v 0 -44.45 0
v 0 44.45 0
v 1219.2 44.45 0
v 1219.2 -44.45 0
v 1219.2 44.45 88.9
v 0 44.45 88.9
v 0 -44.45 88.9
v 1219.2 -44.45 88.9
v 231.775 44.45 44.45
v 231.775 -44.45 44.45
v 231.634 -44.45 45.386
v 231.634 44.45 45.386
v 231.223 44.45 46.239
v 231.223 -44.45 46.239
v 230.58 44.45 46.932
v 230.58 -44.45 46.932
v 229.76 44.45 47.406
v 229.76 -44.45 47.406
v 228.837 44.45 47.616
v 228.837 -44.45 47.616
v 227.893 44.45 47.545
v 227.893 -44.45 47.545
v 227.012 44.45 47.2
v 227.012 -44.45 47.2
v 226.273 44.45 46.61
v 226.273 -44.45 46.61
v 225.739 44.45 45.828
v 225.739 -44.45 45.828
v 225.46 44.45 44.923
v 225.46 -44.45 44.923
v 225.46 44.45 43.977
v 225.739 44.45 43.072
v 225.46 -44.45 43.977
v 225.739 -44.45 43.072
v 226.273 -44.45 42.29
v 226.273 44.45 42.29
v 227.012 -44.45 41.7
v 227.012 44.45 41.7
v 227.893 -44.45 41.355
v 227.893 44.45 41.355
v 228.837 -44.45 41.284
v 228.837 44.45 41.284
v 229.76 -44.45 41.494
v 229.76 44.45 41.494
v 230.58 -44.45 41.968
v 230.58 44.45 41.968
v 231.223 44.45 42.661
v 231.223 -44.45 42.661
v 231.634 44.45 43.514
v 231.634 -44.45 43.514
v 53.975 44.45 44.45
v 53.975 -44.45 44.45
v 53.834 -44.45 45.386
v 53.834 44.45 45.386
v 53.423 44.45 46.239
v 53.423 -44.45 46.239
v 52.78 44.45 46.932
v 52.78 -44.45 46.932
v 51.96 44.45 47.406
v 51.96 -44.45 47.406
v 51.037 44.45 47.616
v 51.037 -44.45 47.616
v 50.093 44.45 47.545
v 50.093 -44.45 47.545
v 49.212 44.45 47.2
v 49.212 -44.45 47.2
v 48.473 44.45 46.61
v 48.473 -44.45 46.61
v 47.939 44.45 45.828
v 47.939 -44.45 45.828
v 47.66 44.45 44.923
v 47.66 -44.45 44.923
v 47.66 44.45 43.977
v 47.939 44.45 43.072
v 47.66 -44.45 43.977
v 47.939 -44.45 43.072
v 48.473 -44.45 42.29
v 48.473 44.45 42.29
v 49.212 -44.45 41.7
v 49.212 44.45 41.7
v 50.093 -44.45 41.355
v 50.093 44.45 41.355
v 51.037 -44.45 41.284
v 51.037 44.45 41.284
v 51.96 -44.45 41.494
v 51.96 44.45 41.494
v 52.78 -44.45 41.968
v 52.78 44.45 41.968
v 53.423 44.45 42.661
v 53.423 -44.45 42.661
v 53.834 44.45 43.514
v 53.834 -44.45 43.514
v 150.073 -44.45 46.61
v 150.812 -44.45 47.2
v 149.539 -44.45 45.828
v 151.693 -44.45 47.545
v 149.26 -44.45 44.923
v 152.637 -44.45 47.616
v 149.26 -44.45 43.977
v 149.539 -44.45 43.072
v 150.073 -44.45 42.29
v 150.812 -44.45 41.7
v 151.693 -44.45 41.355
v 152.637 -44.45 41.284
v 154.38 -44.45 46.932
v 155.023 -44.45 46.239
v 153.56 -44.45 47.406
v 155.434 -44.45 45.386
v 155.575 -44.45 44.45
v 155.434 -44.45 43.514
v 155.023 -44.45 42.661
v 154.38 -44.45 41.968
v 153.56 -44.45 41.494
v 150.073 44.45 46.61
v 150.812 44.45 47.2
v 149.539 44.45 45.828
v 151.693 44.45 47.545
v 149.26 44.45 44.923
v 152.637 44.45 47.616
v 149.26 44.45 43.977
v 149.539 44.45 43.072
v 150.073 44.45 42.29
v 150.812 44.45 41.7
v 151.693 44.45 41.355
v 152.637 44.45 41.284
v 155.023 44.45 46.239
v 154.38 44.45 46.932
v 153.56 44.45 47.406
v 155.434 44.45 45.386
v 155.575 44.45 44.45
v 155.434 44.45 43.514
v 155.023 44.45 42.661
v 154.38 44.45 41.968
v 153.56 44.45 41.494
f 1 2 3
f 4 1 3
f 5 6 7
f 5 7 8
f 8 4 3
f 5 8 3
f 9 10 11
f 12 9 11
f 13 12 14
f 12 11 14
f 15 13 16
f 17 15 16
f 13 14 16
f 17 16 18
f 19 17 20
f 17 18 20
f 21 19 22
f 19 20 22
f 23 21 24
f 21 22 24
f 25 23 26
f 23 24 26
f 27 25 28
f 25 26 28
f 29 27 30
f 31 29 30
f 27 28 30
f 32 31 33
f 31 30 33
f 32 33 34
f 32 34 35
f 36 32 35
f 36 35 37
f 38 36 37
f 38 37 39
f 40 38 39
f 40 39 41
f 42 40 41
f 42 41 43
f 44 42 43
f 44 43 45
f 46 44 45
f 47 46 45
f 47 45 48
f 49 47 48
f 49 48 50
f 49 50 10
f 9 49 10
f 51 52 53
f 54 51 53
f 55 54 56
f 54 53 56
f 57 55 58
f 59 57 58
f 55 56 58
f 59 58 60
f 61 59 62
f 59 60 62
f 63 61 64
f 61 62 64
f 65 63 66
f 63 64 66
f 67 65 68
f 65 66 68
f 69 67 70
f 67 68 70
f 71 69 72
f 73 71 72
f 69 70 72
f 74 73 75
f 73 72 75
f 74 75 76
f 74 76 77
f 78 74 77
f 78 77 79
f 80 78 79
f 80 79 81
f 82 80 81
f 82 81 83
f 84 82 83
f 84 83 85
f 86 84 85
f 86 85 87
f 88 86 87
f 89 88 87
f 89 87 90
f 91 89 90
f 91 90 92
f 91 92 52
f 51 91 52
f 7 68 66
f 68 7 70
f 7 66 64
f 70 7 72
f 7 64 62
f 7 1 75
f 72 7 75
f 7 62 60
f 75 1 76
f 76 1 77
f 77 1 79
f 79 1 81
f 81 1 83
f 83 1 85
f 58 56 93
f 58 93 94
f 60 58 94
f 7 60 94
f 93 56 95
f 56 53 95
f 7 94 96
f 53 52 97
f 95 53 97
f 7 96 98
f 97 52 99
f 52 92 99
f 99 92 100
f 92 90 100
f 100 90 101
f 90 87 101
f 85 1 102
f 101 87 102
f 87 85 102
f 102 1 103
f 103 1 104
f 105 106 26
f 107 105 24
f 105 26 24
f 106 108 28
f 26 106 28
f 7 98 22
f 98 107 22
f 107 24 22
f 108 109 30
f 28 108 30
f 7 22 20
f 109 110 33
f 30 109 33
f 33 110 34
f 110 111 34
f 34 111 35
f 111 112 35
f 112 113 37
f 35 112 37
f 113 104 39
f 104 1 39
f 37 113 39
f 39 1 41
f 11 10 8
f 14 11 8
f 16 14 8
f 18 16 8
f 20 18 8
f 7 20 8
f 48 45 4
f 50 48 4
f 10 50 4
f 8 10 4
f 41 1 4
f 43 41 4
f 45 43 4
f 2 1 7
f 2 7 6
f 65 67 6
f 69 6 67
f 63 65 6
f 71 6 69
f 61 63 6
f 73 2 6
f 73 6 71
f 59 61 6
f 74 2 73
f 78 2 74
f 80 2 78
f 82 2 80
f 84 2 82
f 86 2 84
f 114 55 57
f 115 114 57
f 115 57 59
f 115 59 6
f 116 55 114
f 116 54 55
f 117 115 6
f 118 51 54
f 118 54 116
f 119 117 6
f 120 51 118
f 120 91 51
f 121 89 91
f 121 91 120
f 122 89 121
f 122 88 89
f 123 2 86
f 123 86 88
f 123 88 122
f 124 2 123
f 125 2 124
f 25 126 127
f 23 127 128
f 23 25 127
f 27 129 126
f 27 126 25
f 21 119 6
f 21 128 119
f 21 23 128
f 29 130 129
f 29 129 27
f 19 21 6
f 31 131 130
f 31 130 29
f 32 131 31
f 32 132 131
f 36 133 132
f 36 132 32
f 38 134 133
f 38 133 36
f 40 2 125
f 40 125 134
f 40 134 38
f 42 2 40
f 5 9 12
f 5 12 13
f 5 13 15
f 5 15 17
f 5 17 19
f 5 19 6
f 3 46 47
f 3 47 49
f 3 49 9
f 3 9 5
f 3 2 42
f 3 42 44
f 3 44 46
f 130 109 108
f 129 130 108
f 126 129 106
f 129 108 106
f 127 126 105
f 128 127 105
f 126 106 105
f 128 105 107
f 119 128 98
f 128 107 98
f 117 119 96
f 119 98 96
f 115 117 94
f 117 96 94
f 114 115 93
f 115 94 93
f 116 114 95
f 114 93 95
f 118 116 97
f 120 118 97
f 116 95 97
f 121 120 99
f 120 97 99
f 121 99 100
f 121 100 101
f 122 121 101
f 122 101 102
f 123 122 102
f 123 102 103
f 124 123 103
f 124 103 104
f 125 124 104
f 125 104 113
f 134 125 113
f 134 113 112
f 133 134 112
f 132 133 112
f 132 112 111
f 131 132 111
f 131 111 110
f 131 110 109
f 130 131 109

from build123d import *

# Parameters (mm, degrees)
F0_W     = 1219.2
F0_H     = 44.45
F1_DEPTH = 88.9
F2_W     = 1219.2
F2_H     = 44.45
F3_DEPTH = 88.9
F4_R     = 3.175
F5_DEPTH = 88.901


with BuildPart() as f1:
    # F0 (on Top) → F1 (new body)
    with BuildSketch(Plane.XY):
        with Locations((609.6, -22.225)):
            Rectangle(F0_W, F0_H)
    extrude(amount=F1_DEPTH)

    # F2 (on Top) → F3 (join)
    with BuildSketch(Plane.XY):
        with Locations((609.6, 22.225)):
            Rectangle(F2_W, F2_H)
    extrude(amount=F3_DEPTH)

    # F4 (on face) → F5 (cut, through all)
    with BuildSketch(Plane.XZ.offset(44.45)):
        with Locations((50.8, 44.45)):
            Circle(F4_R)
        with Locations((152.4, 44.45)):
            Circle(F4_R)
        with Locations((228.6, 44.45)):
            Circle(F4_R)
    extrude(amount=-F5_DEPTH, mode=Mode.SUBTRACT)


solid = f1.part
